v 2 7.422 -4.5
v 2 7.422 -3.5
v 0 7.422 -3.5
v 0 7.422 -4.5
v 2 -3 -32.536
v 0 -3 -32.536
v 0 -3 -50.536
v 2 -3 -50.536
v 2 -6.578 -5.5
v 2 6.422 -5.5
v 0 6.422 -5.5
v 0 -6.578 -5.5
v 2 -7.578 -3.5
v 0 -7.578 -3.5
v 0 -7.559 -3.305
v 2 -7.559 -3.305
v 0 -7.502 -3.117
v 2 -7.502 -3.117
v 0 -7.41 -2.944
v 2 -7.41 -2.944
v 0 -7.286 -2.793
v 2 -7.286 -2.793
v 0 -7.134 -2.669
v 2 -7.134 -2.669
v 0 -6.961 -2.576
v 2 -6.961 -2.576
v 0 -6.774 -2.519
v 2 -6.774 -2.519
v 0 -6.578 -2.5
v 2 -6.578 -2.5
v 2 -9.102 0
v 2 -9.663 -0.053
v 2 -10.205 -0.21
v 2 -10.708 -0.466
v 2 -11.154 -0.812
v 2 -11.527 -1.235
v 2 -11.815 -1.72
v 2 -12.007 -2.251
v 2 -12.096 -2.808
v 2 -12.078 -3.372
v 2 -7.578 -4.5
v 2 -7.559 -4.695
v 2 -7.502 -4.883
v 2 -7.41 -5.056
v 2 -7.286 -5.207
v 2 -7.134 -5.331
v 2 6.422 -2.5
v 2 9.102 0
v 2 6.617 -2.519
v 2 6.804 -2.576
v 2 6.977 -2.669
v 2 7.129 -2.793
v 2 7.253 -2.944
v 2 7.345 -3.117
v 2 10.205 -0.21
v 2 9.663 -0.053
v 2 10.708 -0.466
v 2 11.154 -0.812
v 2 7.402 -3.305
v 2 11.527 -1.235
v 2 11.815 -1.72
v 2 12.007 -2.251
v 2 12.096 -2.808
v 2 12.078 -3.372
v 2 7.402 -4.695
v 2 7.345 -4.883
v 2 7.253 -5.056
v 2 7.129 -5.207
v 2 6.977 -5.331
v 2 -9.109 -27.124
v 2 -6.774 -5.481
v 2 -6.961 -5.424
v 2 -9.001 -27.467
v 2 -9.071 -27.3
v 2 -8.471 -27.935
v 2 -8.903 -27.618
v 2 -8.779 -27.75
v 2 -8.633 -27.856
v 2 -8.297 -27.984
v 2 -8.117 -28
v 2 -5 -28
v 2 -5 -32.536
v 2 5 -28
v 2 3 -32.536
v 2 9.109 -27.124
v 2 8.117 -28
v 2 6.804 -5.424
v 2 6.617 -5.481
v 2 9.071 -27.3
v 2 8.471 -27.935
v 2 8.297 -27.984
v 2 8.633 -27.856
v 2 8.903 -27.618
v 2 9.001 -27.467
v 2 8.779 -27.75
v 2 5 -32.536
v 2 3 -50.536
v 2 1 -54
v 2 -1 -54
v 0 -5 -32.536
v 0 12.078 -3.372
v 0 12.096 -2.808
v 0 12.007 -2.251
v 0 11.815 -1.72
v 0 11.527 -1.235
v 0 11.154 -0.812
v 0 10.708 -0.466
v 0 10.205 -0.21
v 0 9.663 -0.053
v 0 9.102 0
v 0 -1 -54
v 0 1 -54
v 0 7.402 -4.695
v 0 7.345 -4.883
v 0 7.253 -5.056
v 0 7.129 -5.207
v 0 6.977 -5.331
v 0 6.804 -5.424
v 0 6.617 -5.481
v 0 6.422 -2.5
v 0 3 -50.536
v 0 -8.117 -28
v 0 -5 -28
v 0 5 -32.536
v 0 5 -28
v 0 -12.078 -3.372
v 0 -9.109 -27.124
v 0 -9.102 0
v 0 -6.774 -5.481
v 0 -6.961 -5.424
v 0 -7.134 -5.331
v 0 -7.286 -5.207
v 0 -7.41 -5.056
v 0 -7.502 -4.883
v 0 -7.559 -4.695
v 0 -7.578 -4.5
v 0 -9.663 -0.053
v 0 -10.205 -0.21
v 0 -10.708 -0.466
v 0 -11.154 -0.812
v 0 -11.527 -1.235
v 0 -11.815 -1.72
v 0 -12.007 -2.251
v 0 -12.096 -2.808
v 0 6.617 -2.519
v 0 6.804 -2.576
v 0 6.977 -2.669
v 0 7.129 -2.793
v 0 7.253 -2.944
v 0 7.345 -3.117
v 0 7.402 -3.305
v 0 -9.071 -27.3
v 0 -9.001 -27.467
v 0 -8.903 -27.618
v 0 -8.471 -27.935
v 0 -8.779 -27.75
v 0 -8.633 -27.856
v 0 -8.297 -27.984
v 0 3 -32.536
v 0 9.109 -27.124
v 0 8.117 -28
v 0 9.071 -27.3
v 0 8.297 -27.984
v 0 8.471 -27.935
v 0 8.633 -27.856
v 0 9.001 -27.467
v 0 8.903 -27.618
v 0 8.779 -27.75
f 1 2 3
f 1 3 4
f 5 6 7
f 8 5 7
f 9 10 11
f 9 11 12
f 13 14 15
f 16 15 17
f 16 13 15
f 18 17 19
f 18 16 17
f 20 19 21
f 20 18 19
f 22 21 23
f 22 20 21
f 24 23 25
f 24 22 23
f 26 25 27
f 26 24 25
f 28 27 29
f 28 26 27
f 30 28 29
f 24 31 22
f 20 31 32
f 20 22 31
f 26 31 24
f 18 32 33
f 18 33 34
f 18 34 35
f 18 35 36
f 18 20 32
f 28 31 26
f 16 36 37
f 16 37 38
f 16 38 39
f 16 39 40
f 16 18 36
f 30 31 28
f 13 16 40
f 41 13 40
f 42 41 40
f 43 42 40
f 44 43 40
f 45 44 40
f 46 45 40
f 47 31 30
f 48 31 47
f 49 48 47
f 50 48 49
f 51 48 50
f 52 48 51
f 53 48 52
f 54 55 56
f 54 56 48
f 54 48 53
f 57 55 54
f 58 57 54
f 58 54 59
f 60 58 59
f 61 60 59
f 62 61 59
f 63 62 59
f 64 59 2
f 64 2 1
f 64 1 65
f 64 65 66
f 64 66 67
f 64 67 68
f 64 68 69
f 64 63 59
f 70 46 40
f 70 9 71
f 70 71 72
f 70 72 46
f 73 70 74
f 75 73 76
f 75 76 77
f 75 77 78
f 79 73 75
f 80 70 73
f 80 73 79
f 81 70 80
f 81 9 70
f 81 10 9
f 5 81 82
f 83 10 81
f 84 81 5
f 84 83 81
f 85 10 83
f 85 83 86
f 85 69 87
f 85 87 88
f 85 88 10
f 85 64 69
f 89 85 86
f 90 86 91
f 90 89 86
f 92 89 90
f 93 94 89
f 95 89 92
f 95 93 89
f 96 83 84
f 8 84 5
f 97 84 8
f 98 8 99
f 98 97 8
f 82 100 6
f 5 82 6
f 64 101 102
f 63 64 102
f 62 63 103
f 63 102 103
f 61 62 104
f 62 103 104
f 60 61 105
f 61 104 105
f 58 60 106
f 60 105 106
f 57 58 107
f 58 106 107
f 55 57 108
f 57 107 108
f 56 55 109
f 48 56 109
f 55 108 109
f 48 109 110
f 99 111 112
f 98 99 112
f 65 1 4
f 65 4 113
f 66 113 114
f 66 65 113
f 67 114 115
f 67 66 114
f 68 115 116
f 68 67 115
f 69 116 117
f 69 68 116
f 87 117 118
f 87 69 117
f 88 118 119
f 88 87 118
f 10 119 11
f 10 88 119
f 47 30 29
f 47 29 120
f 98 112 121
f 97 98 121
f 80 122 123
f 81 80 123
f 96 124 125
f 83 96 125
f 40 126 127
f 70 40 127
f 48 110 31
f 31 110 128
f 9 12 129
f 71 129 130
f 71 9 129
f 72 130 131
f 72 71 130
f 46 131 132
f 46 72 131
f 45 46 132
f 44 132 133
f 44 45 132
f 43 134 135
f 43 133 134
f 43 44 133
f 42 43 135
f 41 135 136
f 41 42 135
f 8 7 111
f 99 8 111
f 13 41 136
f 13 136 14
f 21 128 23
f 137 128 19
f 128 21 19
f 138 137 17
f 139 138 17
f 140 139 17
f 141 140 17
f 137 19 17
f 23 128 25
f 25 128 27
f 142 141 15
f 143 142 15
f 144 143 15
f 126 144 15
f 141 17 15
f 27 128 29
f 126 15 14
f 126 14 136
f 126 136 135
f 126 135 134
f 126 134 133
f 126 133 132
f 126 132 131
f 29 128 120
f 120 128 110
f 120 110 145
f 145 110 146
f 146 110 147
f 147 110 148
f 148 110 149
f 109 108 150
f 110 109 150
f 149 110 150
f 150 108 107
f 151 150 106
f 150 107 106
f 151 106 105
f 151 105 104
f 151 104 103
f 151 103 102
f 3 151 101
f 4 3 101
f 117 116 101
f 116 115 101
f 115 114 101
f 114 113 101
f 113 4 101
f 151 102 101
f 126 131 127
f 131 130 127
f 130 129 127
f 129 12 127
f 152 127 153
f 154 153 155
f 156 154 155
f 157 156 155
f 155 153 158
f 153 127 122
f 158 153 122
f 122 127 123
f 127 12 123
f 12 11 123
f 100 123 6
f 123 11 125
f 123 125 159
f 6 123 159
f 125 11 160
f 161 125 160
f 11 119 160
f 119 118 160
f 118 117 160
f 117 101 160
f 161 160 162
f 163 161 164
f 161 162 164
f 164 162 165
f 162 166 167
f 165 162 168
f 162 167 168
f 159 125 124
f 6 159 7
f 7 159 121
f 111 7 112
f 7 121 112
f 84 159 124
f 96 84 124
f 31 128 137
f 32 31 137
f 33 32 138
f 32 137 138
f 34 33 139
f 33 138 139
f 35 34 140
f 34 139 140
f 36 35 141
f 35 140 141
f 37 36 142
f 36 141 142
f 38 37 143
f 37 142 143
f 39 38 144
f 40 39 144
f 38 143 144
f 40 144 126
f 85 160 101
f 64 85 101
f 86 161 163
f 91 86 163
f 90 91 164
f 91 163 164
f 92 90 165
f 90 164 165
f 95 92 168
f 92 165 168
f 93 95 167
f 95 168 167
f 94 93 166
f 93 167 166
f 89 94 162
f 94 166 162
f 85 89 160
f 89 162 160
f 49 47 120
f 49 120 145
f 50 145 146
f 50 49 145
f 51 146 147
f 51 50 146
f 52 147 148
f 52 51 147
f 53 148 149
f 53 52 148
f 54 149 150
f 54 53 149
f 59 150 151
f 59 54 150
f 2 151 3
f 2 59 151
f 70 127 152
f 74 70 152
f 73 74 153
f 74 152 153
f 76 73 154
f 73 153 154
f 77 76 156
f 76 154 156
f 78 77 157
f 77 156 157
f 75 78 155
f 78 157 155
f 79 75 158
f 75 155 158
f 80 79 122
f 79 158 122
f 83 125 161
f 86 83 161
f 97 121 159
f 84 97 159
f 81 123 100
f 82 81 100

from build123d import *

# Parameters (mm, degrees)
BOSS_EXTRUDE1_DEPTH = 2
CUT_EXTRUDE1_DEPTH  = 56.375536238


with BuildPart() as part:
    # Sketch1 → Boss-Extrude1 (new body)
    with BuildSketch(Plane(origin=(0, 0, 0), x_dir=(0, 0, -1), z_dir=(1, 0, 0))):
        with BuildLine():
            Line((0, 9.101653344), (0, 0))
            Line((0, 0), (54, 0))
            Line((54, 0), (54, 1))
            Line((54, 1), (50.535898385, 3))
            Line((50.535898385, 3), (32.535898385, 3))
            Line((32.535898385, 3), (32.535898385, 5))
            Line((32.535898385, 5), (28, 5))
            Line((28, 5), (28, 8.117217781))
            ThreePointArc((28, 8.117217781), (27.749678176, 8.779020345), (27.124034735, 9.109495658))
            Line((27.124034735, 9.109495658), (3.372104204, 12.078486975))
            ThreePointArc((3.372104204, 12.078486975), (1.01459231, 11.350687872), (0, 9.101653344))
        make_face()
        with BuildLine():
            Line((0, 0), (0, -9.101653344))
            ThreePointArc((0, -9.101653344), (1.01459231, -11.350687872), (3.372104204, -12.078486975))
            Line((3.372104204, -12.078486975), (27.124034735, -9.109495658))
            ThreePointArc((27.124034735, -9.109495658), (27.749678176, -8.779020345), (28, -8.117217781))
            Line((28, -8.117217781), (28, -5))
            Line((28, -5), (32.535898385, -5))
            Line((32.535898385, -5), (32.535898385, -3))
            Line((32.535898385, -3), (50.535898385, -3))
            Line((50.535898385, -3), (54, -1))
            Line((54, -1), (54, 0))
            Line((54, 0), (0, 0))
        make_face()
    extrude(amount=BOSS_EXTRUDE1_DEPTH)

    # Sketch2 → Cut-Extrude1 (cut, through all)
    with BuildSketch(Plane(origin=(2, 0, 0), x_dir=(0, 0, -1), z_dir=(1, 0, 0))):
        with BuildLine():
            Line((4.5, -7.578486975), (3.5, -7.578486975))
            ThreePointArc((3.5, -7.578486975), (2.792893219, -7.285593756), (2.5, -6.578486975))
            Line((2.5, -6.578486975), (2.5, 6.421513025))
            ThreePointArc((2.5, 6.421513025), (2.792893219, 7.128619807), (3.5, 7.421513025))
            Line((3.5, 7.421513025), (4.5, 7.421513025))
            ThreePointArc((4.5, 7.421513025), (5.207106781, 7.128619807), (5.5, 6.421513025))
            Line((5.5, 6.421513025), (5.5, -6.578486975))
            ThreePointArc((5.5, -6.578486975), (5.207106781, -7.285593756), (4.5, -7.578486975))
        make_face()
    extrude(amount=-CUT_EXTRUDE1_DEPTH, mode=Mode.SUBTRACT)


solid = part.part
